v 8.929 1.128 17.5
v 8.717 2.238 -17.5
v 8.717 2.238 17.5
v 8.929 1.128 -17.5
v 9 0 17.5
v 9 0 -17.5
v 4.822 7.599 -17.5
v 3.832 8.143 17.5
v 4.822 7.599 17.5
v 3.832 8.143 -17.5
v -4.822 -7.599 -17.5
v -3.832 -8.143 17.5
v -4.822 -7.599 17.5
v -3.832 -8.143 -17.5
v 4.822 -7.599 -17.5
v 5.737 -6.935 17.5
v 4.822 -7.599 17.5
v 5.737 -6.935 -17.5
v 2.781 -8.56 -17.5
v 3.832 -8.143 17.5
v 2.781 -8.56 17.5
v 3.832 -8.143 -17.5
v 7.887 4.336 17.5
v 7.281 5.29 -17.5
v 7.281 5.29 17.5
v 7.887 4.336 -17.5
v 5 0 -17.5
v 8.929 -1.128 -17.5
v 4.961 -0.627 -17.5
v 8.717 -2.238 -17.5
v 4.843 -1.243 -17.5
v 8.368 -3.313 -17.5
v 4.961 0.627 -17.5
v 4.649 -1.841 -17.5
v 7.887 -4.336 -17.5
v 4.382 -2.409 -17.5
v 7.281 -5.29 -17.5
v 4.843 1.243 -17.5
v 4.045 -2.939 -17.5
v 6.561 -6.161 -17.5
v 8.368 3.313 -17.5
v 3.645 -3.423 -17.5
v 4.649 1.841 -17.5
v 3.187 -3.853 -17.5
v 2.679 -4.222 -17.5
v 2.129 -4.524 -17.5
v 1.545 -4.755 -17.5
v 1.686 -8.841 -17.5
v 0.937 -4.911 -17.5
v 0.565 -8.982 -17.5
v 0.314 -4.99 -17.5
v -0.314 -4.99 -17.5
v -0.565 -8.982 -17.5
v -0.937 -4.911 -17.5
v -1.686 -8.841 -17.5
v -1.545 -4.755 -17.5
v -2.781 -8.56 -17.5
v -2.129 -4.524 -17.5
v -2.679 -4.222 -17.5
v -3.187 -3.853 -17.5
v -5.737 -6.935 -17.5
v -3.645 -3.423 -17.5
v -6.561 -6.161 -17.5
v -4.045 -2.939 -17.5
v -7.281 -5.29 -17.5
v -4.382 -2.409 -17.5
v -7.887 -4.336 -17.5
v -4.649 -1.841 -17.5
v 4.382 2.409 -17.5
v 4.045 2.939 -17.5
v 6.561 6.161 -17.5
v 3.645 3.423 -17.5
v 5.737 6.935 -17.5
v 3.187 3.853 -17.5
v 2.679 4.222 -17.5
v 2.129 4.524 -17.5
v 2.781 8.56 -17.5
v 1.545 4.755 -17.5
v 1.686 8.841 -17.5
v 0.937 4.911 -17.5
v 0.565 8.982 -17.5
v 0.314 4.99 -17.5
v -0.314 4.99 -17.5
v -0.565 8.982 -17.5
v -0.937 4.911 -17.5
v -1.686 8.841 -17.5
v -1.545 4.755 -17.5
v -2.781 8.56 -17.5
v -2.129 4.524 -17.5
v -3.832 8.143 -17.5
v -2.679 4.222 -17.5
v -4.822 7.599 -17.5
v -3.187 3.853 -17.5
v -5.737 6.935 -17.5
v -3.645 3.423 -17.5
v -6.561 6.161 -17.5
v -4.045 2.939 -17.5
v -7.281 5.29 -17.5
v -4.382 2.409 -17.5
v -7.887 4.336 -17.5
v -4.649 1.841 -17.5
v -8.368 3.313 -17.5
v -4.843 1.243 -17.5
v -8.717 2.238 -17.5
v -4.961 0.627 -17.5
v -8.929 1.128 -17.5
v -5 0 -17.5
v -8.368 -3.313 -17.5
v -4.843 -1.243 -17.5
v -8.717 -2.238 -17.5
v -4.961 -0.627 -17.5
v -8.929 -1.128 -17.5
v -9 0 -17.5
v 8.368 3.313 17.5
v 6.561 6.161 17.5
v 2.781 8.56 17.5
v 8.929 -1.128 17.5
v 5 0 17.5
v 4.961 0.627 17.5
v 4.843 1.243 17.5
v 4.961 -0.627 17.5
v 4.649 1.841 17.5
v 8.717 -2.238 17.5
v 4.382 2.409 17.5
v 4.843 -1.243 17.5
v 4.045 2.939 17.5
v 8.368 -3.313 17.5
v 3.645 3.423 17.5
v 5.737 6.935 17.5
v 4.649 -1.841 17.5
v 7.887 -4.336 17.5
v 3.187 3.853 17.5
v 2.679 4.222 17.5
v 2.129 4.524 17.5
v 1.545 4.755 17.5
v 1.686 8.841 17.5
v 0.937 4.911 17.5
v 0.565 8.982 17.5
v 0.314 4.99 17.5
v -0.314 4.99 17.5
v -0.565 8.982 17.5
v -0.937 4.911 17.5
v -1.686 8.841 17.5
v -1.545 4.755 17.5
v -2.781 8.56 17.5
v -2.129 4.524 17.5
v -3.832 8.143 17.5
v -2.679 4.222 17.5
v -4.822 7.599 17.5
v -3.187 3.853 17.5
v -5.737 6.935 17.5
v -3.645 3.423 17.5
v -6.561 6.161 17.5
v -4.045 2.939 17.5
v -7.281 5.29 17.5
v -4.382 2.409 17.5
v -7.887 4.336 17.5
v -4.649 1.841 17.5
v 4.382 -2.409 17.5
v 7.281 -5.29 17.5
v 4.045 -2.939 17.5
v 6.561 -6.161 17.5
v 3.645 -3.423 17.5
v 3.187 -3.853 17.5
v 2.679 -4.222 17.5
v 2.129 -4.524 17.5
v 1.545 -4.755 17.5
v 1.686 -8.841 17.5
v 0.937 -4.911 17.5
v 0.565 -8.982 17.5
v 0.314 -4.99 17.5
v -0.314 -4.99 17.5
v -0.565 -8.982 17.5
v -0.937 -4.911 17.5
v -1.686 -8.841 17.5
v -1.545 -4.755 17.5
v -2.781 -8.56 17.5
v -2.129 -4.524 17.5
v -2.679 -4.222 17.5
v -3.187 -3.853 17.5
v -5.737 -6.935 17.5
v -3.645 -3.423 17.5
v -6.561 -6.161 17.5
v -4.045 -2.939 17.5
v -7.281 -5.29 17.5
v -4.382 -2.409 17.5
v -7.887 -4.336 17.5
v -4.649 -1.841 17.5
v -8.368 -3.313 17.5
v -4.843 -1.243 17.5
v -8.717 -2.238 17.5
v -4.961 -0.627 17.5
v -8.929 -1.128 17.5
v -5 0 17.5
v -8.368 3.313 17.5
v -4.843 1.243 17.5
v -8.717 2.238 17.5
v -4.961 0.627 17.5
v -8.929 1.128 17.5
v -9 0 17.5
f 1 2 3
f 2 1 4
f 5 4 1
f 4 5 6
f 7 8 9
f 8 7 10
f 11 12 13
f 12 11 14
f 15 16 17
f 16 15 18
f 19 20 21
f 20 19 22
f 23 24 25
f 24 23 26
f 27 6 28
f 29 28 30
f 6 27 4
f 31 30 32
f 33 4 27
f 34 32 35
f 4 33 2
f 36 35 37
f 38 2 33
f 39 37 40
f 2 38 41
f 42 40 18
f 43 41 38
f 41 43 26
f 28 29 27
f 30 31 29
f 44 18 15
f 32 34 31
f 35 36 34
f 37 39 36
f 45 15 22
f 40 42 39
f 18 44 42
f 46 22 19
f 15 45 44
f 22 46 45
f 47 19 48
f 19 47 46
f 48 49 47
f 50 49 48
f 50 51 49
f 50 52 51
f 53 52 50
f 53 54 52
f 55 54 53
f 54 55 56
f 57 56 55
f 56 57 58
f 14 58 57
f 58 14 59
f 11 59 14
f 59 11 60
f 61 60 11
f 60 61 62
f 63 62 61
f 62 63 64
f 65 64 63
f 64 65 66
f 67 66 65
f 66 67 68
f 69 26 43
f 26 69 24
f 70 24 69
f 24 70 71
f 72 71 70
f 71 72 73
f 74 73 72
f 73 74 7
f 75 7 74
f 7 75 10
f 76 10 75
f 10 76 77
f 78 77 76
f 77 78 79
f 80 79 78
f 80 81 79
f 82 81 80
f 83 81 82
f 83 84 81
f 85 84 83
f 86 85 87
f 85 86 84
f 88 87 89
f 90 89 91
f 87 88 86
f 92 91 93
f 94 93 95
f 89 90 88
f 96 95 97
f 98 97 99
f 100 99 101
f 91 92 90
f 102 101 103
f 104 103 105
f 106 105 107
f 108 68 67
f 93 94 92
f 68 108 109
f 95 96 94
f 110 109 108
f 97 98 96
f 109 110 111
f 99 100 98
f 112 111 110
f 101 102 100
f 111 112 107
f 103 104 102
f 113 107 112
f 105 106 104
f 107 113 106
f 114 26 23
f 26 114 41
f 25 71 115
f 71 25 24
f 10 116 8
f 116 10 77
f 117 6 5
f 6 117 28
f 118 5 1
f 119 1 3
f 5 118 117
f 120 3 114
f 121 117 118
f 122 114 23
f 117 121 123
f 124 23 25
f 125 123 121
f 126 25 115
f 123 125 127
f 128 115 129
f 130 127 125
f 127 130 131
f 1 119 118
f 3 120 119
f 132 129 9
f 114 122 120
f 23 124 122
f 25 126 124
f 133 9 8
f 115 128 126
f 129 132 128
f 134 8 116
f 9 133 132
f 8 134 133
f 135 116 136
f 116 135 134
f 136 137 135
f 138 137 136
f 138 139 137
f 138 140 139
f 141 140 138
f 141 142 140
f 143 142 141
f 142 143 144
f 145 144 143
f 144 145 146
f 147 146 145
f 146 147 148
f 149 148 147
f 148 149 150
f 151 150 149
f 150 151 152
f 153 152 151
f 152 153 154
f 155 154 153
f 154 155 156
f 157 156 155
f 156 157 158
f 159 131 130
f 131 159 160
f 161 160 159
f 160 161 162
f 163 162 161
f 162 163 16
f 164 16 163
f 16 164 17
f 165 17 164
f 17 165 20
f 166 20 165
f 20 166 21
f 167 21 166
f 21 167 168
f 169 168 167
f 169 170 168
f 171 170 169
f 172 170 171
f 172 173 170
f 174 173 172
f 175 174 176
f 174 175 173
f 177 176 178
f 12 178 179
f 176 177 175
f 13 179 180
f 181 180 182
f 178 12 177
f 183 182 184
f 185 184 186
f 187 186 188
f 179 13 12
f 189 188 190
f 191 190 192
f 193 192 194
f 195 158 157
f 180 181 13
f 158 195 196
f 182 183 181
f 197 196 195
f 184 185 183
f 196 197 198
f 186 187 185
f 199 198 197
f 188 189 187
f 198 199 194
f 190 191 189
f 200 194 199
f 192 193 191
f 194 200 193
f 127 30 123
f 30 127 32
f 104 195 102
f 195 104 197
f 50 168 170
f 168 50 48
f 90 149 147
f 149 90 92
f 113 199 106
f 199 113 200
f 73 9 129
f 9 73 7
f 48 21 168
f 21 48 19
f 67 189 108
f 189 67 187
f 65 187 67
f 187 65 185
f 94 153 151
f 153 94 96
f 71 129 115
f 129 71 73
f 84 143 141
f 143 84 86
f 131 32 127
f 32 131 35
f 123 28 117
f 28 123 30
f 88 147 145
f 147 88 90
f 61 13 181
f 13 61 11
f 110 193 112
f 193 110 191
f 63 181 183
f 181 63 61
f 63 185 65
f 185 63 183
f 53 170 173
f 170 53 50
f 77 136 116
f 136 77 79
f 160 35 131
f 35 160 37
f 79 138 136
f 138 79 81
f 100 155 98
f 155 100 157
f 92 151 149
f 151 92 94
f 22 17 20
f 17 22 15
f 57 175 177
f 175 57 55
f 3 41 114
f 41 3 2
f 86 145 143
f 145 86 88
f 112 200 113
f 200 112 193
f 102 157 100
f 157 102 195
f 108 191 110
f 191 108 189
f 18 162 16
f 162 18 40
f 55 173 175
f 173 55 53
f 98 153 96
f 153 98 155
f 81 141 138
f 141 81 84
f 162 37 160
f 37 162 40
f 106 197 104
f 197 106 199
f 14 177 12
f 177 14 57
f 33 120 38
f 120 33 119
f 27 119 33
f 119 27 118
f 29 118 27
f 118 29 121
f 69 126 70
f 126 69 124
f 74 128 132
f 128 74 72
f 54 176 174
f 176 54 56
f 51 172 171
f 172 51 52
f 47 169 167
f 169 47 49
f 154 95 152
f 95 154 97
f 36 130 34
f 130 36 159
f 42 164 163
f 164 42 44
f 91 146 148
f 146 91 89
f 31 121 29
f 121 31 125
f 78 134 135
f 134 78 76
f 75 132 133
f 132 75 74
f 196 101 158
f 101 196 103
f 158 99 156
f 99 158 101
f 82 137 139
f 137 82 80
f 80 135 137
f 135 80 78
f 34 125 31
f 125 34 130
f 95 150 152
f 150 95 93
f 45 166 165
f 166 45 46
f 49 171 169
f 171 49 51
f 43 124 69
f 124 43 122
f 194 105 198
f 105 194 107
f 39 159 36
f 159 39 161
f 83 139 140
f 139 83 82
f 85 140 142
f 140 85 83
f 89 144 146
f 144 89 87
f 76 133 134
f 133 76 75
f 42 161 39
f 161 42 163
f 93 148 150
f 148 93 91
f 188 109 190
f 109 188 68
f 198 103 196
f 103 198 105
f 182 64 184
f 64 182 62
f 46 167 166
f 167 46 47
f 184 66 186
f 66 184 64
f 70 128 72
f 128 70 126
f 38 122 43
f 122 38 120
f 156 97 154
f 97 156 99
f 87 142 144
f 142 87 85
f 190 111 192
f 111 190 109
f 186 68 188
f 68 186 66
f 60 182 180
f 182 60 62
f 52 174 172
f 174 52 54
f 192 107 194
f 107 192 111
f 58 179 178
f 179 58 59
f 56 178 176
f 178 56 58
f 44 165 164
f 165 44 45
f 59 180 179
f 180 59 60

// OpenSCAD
$fn = 50;


difference() {
	union() {
		translate(v = [0, 0, -17.5000000000]) {
			cylinder(h = 35, r = 9.0000000000);
		}
	}
	union() {
		translate(v = [0, 0, -100.0000000000]) {
			cylinder(h = 200, r = 5.0000000000);
		}
	}
}
